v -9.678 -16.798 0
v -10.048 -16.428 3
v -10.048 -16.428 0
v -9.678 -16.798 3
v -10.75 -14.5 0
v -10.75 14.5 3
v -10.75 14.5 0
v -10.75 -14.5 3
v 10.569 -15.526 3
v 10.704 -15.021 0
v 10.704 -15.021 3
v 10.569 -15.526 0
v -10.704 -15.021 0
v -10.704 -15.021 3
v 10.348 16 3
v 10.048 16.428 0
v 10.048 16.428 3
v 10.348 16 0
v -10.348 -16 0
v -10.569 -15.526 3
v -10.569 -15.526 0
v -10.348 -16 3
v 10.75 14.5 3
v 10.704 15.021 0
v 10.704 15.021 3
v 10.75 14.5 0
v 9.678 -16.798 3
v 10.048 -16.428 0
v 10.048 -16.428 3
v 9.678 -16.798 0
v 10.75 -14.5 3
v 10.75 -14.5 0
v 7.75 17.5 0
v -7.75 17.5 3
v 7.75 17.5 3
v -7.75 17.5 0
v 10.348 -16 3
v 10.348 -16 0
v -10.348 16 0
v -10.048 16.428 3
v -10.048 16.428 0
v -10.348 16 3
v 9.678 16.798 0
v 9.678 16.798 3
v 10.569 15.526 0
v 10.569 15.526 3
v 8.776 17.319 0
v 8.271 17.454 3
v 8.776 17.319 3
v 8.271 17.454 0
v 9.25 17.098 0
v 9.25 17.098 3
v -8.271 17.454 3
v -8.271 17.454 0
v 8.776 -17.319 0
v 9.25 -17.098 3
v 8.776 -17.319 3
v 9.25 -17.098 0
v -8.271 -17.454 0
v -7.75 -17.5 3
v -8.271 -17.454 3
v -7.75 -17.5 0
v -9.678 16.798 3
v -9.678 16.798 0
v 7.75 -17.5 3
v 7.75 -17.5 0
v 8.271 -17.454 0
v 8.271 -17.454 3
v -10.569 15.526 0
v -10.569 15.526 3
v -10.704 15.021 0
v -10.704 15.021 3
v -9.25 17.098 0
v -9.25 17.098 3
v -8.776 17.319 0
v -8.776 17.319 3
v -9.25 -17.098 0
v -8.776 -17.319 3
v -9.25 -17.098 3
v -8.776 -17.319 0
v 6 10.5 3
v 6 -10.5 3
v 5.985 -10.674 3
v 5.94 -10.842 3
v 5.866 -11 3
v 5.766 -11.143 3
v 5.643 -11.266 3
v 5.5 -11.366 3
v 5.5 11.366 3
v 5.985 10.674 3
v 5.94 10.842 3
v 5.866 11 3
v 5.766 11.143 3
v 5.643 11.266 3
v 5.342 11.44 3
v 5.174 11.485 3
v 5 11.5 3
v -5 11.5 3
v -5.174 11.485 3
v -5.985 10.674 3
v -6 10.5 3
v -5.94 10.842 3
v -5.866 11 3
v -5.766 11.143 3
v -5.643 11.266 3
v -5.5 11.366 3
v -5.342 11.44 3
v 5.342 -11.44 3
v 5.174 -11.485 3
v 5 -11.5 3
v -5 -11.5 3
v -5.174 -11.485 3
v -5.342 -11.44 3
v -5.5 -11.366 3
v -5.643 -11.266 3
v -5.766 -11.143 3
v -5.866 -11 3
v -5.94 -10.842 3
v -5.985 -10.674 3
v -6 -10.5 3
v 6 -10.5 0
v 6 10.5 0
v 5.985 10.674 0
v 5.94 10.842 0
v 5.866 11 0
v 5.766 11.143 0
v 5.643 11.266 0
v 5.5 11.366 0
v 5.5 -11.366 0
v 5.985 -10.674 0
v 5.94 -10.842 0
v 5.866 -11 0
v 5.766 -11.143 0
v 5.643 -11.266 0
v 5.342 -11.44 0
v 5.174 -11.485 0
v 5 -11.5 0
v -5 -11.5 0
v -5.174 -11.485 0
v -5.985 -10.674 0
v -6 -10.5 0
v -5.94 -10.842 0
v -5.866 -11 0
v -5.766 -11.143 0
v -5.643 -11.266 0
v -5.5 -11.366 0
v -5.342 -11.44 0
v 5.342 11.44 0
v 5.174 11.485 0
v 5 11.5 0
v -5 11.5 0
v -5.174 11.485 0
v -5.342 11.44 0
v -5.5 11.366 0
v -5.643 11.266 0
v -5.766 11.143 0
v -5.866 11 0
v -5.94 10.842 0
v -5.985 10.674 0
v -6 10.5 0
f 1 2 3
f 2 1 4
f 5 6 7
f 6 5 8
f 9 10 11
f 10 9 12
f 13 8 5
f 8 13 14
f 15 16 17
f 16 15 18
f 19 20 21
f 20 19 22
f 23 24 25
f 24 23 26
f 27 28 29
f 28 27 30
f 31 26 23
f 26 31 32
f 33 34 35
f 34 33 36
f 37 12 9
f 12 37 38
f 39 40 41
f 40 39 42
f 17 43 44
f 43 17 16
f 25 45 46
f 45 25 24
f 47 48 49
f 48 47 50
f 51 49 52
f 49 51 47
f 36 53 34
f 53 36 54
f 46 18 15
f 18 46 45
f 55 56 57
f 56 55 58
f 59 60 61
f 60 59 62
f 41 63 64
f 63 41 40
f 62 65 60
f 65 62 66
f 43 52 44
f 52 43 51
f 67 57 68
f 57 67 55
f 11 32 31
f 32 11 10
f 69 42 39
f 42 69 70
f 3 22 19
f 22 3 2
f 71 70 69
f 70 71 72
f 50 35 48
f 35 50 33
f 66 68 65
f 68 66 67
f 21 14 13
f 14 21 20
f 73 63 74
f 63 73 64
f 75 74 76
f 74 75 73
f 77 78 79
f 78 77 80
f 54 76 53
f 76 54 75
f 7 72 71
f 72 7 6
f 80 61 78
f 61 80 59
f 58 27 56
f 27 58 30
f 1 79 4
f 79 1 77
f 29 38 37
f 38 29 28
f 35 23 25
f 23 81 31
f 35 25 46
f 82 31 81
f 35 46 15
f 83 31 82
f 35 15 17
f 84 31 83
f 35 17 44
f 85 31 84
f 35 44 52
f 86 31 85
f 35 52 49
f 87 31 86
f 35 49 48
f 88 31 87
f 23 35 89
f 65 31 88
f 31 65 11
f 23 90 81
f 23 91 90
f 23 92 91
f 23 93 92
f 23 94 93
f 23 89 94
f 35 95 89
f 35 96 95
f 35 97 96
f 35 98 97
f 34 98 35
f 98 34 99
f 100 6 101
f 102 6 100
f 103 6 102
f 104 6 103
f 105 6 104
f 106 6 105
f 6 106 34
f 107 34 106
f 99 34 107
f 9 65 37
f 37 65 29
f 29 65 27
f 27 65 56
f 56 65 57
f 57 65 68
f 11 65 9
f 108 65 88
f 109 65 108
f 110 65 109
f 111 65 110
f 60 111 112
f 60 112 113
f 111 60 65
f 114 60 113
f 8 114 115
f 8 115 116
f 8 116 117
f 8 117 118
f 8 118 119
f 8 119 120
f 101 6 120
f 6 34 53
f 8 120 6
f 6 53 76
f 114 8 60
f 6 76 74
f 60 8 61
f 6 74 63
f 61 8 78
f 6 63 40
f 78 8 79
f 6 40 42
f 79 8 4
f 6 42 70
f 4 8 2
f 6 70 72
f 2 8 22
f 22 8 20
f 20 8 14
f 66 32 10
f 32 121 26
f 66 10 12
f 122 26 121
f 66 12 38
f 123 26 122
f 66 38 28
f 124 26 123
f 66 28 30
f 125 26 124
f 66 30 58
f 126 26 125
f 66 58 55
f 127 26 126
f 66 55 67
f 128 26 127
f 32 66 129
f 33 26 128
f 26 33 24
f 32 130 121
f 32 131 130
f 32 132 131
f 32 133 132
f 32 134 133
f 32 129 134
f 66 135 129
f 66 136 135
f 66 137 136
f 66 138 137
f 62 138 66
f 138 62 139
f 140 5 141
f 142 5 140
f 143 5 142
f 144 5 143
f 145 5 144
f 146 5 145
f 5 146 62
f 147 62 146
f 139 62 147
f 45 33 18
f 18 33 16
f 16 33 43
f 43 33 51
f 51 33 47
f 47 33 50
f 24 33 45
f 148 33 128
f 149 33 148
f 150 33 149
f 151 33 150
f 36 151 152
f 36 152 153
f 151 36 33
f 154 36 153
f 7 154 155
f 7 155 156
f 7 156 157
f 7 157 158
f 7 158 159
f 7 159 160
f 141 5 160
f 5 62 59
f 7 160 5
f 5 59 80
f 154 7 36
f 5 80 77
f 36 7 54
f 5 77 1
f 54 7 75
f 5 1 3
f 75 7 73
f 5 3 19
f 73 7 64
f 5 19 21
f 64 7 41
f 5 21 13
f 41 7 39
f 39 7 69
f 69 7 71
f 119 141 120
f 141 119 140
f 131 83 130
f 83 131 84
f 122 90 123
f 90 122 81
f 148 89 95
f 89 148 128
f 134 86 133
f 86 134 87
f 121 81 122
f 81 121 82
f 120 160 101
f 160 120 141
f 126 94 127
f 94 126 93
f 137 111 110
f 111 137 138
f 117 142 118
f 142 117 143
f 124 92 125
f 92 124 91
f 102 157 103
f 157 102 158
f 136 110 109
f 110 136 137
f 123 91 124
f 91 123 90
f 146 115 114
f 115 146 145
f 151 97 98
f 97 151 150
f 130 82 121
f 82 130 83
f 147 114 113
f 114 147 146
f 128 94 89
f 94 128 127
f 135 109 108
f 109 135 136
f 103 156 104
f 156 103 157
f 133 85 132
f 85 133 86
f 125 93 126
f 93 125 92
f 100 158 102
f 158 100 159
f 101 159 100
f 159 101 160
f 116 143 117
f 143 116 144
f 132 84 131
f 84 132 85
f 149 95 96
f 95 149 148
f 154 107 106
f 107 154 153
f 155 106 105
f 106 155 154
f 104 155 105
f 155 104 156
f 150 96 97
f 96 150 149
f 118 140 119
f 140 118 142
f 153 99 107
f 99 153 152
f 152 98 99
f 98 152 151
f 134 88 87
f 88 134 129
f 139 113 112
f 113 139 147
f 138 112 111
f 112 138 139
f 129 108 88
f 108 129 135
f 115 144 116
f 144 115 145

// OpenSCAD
// seatbelt pacifier
// 2025 Brian K. White - b.kenyon.w@gmail.com

ow = 21.5;
ol = 35;
ot = 3;
or = 3;

io = 6;
iw = 12;
il = ol-io*2;
ir = 1;

e = 0.1;
$fn = 36;

module mirror_copy(v = [1, 0, 0]) {
  children();
  if (v[0]||v[1]||v[2]) mirror(v) children();
}

module qc (w=10,d=10,h=10,r=1) {
  mirror_copy([0,1,0]) translate([0,d/2,0])
    mirror_copy([1,0,0]) translate([w/2,0,0])
      cylinder(h=h,r=(r<e?e:r));
}

module sqylinder(w=10,d=10,h=10,r=1) {
  if (r<=0) translate([-w/2,-d/2,0]) cube([w,d,h]);
  else hull() qc(w=w-r*2,d=d-r*2,h=h,r=r);
}

difference() {
  sqylinder(w=ow,d=ol,h=ot,r=or);
  translate([0,0,-e]) sqylinder(w=iw,d=il,h=ot+e*2,r=ir);
}
